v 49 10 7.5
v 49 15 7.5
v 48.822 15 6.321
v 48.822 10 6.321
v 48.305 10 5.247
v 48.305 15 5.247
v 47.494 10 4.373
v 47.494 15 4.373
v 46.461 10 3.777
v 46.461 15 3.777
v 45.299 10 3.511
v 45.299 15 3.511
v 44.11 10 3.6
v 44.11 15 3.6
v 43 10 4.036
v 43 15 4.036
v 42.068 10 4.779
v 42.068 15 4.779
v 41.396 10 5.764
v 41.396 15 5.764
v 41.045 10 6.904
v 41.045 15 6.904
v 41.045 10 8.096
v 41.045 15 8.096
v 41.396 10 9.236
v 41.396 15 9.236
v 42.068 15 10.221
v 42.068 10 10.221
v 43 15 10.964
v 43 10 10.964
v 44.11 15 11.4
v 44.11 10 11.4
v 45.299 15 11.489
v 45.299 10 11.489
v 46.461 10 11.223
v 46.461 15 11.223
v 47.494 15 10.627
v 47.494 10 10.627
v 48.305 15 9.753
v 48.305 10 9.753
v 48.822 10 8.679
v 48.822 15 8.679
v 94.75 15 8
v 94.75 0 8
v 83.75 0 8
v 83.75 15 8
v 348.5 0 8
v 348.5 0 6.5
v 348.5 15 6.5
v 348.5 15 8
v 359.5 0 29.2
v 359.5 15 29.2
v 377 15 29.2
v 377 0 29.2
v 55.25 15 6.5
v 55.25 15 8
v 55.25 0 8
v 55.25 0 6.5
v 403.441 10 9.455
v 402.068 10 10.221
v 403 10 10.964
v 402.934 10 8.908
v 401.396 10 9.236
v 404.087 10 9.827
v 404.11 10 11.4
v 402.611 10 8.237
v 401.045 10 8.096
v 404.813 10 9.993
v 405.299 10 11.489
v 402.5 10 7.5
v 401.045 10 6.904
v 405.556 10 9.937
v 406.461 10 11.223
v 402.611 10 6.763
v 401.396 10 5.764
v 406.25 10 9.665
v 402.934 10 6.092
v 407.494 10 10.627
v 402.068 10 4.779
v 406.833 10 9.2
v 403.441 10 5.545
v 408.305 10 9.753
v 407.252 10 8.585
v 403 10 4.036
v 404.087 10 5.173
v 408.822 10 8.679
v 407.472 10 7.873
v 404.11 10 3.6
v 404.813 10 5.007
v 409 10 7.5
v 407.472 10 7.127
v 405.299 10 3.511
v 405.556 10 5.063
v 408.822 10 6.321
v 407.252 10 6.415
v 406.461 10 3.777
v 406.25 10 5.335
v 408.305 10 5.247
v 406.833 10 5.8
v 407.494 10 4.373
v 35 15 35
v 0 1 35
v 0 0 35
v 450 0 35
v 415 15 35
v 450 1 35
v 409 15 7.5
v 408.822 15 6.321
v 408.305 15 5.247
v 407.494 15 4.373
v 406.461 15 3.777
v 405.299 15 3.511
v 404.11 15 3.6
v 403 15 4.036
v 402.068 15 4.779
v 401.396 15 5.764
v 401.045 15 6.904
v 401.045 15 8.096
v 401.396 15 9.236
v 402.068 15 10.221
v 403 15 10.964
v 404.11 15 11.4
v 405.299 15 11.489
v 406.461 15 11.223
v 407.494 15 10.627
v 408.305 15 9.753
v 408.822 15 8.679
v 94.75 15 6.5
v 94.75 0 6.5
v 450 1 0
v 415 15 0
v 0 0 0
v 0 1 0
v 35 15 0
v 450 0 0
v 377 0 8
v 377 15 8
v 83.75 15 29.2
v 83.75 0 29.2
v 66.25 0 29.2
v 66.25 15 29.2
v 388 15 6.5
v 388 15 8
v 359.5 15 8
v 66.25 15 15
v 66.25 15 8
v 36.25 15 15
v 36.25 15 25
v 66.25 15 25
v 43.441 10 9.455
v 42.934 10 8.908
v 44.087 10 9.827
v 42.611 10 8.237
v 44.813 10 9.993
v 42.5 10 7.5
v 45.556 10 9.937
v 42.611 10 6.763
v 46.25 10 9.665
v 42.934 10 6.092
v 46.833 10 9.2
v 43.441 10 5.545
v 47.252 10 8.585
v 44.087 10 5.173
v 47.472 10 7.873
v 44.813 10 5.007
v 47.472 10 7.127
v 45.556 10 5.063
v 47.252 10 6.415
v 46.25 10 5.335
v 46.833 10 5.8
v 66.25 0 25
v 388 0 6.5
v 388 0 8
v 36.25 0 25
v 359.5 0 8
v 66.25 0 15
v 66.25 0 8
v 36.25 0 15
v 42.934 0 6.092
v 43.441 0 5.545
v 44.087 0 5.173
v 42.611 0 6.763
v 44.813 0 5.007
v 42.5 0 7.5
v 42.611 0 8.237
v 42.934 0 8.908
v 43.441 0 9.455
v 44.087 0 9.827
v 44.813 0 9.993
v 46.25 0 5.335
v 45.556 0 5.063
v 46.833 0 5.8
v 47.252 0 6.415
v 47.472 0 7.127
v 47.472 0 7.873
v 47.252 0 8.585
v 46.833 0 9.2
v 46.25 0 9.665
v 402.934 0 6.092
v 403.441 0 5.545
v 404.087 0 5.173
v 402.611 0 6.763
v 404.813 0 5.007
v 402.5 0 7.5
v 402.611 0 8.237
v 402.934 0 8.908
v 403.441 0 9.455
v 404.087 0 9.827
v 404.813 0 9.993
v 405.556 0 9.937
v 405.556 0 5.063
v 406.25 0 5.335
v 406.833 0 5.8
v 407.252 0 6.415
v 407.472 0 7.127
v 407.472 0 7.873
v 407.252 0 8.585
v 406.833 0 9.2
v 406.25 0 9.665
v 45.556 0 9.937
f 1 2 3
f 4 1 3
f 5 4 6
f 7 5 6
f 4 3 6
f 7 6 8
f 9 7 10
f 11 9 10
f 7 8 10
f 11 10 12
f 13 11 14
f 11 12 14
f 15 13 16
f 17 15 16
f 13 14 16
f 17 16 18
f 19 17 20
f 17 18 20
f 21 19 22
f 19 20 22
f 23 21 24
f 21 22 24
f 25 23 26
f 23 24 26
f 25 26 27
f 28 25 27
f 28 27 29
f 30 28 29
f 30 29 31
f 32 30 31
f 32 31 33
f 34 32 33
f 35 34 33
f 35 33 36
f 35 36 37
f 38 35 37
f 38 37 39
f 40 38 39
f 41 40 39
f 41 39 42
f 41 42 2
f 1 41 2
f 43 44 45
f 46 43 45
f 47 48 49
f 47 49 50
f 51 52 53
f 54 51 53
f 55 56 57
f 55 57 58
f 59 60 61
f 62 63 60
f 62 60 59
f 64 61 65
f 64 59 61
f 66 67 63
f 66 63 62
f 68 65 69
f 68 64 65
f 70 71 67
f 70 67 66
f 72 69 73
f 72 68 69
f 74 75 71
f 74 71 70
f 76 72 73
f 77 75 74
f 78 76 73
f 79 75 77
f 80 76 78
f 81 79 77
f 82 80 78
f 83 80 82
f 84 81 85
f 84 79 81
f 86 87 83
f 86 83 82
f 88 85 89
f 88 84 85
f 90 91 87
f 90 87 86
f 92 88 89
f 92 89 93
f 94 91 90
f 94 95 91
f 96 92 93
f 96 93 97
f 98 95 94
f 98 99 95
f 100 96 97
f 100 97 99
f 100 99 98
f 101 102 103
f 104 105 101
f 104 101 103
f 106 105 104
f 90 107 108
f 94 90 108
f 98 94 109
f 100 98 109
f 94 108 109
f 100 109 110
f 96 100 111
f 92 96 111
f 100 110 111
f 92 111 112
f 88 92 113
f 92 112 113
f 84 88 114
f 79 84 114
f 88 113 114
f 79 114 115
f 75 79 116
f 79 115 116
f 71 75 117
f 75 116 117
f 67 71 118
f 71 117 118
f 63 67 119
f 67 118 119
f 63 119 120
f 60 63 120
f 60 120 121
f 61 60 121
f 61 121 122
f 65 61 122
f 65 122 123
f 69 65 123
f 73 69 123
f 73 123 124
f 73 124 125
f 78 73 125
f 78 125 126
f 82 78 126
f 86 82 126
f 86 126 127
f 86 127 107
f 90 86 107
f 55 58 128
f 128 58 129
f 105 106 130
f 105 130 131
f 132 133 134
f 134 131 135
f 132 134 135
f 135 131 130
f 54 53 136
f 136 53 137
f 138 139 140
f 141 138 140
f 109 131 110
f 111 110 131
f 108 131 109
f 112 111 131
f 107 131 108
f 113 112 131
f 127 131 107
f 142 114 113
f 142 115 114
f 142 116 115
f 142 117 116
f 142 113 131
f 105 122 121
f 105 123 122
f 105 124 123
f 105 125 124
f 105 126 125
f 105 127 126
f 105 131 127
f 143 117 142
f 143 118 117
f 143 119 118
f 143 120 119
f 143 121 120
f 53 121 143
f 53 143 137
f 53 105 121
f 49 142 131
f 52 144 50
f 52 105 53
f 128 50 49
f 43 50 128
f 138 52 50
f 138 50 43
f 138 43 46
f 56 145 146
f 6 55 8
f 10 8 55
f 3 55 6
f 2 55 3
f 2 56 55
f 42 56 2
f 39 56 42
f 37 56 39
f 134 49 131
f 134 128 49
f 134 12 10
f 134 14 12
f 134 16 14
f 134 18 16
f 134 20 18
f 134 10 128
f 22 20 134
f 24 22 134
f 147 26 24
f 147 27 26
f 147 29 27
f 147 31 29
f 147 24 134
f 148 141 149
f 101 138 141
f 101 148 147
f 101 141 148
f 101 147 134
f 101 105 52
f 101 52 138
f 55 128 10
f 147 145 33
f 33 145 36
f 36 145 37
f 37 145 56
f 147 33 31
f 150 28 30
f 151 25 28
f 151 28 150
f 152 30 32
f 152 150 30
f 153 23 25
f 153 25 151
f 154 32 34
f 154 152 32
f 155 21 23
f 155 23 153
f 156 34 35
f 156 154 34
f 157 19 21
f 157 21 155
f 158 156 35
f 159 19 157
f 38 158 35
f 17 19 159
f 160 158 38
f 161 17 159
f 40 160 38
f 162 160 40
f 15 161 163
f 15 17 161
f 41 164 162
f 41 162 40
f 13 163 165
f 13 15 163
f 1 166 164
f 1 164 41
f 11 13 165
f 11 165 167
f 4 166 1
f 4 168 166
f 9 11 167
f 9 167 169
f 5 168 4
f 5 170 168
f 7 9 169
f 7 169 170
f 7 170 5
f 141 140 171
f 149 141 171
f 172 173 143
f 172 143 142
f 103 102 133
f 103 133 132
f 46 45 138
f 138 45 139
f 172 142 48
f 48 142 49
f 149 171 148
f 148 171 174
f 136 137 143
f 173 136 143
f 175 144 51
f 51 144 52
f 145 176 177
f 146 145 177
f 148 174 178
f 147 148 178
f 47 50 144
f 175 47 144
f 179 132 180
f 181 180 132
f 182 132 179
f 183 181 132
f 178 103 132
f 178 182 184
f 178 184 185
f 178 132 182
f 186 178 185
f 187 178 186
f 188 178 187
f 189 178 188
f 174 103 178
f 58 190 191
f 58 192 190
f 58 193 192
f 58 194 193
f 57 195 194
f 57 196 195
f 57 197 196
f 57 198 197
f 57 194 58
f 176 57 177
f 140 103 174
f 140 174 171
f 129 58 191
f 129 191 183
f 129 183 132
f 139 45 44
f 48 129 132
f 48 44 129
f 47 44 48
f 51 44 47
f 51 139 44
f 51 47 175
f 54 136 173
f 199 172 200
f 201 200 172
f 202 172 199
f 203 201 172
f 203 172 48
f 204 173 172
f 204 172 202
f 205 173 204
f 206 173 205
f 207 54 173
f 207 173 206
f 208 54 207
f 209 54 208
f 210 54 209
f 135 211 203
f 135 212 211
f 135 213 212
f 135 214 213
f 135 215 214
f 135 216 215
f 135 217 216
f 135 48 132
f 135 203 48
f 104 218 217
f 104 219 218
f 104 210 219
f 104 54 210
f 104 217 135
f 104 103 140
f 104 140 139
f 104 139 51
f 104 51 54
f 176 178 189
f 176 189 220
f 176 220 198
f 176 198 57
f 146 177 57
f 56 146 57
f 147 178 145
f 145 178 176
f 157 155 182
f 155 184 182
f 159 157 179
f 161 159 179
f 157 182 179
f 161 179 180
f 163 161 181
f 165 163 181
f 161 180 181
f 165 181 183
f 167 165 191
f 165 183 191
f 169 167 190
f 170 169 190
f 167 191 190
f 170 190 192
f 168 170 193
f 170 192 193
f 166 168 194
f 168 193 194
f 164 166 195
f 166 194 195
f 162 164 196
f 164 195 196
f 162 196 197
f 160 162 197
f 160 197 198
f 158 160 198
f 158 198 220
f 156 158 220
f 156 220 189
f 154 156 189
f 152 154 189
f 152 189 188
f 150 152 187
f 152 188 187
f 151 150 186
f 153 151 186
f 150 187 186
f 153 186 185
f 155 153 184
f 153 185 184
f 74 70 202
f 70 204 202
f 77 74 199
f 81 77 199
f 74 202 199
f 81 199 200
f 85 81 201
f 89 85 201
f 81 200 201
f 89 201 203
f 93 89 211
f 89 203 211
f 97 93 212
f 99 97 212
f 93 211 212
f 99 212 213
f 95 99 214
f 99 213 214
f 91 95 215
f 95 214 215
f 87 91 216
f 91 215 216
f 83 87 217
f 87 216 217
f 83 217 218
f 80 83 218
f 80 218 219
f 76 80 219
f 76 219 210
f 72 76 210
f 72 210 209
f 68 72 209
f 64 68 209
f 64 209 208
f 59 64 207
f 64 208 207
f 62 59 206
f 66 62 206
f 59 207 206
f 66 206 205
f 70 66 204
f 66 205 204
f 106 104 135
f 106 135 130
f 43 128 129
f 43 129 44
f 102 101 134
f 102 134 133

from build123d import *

# Parameters (mm, degrees)
BOSS_EXTRUDE1_DEPTH             = 35
CUT_EXTRUDE1_DEPTH              = 452.608237303
CUT_EXTRUDE2_DEPTH              = 452.608237303
M8X1_0_TAPPED_HOLE1_D           = 5
M8X1_0_TAPPED_HOLE1_CBORE_D     = 8
M8X1_0_TAPPED_HOLE1_CBORE_DEPTH = 5


with BuildPart() as part:
    # Sketch1 → Boss-Extrude1 (new body)
    with BuildSketch(Plane.XY.offset(35)):
        Polygon((0, 0), (450, 0), (450, 1), (415, 15), (35, 15), (0, 1), align=None)
    extrude(amount=-BOSS_EXTRUDE1_DEPTH)

    # Sketch2 → Cut-Extrude1 (cut, through all)
    with BuildSketch(Plane(origin=(0, 15, 0), x_dir=(-1, 0, 0), z_dir=(0, 1, 0))):
        Polygon((-359.5, 8), (-359.5, 29.2), (-377, 29.2), (-377, 8), (-388, 8), (-388, 6.5), (-348.5, 6.5), (-348.5, 8), align=None)
    extrude(amount=-CUT_EXTRUDE1_DEPTH, mode=Mode.SUBTRACT)

    # Sketch3 → Cut-Extrude2 (cut, through all)
    with BuildSketch(Plane.XZ):
        Polygon((66.25, 15), (66.25, 8), (55.25, 8), (55.25, 6.5), (94.75, 6.5), (94.75, 8), (83.75, 8), (83.75, 29.2), (66.25, 29.2), (66.25, 25), (36.25, 25), (36.25, 15), align=None)
    extrude(amount=-CUT_EXTRUDE2_DEPTH, mode=Mode.SUBTRACT)

    # M8x1.0 Tapped Hole1 (through all)
    with Locations(Plane(origin=(0, 15, 0), x_dir=(1, 0, 0), z_dir=(0, 1, 0))):
        with Locations((45, -7.5), (405, -7.5)):
            CounterBoreHole(M8X1_0_TAPPED_HOLE1_D / 2, M8X1_0_TAPPED_HOLE1_CBORE_D / 2, M8X1_0_TAPPED_HOLE1_CBORE_DEPTH)


solid = part.part
